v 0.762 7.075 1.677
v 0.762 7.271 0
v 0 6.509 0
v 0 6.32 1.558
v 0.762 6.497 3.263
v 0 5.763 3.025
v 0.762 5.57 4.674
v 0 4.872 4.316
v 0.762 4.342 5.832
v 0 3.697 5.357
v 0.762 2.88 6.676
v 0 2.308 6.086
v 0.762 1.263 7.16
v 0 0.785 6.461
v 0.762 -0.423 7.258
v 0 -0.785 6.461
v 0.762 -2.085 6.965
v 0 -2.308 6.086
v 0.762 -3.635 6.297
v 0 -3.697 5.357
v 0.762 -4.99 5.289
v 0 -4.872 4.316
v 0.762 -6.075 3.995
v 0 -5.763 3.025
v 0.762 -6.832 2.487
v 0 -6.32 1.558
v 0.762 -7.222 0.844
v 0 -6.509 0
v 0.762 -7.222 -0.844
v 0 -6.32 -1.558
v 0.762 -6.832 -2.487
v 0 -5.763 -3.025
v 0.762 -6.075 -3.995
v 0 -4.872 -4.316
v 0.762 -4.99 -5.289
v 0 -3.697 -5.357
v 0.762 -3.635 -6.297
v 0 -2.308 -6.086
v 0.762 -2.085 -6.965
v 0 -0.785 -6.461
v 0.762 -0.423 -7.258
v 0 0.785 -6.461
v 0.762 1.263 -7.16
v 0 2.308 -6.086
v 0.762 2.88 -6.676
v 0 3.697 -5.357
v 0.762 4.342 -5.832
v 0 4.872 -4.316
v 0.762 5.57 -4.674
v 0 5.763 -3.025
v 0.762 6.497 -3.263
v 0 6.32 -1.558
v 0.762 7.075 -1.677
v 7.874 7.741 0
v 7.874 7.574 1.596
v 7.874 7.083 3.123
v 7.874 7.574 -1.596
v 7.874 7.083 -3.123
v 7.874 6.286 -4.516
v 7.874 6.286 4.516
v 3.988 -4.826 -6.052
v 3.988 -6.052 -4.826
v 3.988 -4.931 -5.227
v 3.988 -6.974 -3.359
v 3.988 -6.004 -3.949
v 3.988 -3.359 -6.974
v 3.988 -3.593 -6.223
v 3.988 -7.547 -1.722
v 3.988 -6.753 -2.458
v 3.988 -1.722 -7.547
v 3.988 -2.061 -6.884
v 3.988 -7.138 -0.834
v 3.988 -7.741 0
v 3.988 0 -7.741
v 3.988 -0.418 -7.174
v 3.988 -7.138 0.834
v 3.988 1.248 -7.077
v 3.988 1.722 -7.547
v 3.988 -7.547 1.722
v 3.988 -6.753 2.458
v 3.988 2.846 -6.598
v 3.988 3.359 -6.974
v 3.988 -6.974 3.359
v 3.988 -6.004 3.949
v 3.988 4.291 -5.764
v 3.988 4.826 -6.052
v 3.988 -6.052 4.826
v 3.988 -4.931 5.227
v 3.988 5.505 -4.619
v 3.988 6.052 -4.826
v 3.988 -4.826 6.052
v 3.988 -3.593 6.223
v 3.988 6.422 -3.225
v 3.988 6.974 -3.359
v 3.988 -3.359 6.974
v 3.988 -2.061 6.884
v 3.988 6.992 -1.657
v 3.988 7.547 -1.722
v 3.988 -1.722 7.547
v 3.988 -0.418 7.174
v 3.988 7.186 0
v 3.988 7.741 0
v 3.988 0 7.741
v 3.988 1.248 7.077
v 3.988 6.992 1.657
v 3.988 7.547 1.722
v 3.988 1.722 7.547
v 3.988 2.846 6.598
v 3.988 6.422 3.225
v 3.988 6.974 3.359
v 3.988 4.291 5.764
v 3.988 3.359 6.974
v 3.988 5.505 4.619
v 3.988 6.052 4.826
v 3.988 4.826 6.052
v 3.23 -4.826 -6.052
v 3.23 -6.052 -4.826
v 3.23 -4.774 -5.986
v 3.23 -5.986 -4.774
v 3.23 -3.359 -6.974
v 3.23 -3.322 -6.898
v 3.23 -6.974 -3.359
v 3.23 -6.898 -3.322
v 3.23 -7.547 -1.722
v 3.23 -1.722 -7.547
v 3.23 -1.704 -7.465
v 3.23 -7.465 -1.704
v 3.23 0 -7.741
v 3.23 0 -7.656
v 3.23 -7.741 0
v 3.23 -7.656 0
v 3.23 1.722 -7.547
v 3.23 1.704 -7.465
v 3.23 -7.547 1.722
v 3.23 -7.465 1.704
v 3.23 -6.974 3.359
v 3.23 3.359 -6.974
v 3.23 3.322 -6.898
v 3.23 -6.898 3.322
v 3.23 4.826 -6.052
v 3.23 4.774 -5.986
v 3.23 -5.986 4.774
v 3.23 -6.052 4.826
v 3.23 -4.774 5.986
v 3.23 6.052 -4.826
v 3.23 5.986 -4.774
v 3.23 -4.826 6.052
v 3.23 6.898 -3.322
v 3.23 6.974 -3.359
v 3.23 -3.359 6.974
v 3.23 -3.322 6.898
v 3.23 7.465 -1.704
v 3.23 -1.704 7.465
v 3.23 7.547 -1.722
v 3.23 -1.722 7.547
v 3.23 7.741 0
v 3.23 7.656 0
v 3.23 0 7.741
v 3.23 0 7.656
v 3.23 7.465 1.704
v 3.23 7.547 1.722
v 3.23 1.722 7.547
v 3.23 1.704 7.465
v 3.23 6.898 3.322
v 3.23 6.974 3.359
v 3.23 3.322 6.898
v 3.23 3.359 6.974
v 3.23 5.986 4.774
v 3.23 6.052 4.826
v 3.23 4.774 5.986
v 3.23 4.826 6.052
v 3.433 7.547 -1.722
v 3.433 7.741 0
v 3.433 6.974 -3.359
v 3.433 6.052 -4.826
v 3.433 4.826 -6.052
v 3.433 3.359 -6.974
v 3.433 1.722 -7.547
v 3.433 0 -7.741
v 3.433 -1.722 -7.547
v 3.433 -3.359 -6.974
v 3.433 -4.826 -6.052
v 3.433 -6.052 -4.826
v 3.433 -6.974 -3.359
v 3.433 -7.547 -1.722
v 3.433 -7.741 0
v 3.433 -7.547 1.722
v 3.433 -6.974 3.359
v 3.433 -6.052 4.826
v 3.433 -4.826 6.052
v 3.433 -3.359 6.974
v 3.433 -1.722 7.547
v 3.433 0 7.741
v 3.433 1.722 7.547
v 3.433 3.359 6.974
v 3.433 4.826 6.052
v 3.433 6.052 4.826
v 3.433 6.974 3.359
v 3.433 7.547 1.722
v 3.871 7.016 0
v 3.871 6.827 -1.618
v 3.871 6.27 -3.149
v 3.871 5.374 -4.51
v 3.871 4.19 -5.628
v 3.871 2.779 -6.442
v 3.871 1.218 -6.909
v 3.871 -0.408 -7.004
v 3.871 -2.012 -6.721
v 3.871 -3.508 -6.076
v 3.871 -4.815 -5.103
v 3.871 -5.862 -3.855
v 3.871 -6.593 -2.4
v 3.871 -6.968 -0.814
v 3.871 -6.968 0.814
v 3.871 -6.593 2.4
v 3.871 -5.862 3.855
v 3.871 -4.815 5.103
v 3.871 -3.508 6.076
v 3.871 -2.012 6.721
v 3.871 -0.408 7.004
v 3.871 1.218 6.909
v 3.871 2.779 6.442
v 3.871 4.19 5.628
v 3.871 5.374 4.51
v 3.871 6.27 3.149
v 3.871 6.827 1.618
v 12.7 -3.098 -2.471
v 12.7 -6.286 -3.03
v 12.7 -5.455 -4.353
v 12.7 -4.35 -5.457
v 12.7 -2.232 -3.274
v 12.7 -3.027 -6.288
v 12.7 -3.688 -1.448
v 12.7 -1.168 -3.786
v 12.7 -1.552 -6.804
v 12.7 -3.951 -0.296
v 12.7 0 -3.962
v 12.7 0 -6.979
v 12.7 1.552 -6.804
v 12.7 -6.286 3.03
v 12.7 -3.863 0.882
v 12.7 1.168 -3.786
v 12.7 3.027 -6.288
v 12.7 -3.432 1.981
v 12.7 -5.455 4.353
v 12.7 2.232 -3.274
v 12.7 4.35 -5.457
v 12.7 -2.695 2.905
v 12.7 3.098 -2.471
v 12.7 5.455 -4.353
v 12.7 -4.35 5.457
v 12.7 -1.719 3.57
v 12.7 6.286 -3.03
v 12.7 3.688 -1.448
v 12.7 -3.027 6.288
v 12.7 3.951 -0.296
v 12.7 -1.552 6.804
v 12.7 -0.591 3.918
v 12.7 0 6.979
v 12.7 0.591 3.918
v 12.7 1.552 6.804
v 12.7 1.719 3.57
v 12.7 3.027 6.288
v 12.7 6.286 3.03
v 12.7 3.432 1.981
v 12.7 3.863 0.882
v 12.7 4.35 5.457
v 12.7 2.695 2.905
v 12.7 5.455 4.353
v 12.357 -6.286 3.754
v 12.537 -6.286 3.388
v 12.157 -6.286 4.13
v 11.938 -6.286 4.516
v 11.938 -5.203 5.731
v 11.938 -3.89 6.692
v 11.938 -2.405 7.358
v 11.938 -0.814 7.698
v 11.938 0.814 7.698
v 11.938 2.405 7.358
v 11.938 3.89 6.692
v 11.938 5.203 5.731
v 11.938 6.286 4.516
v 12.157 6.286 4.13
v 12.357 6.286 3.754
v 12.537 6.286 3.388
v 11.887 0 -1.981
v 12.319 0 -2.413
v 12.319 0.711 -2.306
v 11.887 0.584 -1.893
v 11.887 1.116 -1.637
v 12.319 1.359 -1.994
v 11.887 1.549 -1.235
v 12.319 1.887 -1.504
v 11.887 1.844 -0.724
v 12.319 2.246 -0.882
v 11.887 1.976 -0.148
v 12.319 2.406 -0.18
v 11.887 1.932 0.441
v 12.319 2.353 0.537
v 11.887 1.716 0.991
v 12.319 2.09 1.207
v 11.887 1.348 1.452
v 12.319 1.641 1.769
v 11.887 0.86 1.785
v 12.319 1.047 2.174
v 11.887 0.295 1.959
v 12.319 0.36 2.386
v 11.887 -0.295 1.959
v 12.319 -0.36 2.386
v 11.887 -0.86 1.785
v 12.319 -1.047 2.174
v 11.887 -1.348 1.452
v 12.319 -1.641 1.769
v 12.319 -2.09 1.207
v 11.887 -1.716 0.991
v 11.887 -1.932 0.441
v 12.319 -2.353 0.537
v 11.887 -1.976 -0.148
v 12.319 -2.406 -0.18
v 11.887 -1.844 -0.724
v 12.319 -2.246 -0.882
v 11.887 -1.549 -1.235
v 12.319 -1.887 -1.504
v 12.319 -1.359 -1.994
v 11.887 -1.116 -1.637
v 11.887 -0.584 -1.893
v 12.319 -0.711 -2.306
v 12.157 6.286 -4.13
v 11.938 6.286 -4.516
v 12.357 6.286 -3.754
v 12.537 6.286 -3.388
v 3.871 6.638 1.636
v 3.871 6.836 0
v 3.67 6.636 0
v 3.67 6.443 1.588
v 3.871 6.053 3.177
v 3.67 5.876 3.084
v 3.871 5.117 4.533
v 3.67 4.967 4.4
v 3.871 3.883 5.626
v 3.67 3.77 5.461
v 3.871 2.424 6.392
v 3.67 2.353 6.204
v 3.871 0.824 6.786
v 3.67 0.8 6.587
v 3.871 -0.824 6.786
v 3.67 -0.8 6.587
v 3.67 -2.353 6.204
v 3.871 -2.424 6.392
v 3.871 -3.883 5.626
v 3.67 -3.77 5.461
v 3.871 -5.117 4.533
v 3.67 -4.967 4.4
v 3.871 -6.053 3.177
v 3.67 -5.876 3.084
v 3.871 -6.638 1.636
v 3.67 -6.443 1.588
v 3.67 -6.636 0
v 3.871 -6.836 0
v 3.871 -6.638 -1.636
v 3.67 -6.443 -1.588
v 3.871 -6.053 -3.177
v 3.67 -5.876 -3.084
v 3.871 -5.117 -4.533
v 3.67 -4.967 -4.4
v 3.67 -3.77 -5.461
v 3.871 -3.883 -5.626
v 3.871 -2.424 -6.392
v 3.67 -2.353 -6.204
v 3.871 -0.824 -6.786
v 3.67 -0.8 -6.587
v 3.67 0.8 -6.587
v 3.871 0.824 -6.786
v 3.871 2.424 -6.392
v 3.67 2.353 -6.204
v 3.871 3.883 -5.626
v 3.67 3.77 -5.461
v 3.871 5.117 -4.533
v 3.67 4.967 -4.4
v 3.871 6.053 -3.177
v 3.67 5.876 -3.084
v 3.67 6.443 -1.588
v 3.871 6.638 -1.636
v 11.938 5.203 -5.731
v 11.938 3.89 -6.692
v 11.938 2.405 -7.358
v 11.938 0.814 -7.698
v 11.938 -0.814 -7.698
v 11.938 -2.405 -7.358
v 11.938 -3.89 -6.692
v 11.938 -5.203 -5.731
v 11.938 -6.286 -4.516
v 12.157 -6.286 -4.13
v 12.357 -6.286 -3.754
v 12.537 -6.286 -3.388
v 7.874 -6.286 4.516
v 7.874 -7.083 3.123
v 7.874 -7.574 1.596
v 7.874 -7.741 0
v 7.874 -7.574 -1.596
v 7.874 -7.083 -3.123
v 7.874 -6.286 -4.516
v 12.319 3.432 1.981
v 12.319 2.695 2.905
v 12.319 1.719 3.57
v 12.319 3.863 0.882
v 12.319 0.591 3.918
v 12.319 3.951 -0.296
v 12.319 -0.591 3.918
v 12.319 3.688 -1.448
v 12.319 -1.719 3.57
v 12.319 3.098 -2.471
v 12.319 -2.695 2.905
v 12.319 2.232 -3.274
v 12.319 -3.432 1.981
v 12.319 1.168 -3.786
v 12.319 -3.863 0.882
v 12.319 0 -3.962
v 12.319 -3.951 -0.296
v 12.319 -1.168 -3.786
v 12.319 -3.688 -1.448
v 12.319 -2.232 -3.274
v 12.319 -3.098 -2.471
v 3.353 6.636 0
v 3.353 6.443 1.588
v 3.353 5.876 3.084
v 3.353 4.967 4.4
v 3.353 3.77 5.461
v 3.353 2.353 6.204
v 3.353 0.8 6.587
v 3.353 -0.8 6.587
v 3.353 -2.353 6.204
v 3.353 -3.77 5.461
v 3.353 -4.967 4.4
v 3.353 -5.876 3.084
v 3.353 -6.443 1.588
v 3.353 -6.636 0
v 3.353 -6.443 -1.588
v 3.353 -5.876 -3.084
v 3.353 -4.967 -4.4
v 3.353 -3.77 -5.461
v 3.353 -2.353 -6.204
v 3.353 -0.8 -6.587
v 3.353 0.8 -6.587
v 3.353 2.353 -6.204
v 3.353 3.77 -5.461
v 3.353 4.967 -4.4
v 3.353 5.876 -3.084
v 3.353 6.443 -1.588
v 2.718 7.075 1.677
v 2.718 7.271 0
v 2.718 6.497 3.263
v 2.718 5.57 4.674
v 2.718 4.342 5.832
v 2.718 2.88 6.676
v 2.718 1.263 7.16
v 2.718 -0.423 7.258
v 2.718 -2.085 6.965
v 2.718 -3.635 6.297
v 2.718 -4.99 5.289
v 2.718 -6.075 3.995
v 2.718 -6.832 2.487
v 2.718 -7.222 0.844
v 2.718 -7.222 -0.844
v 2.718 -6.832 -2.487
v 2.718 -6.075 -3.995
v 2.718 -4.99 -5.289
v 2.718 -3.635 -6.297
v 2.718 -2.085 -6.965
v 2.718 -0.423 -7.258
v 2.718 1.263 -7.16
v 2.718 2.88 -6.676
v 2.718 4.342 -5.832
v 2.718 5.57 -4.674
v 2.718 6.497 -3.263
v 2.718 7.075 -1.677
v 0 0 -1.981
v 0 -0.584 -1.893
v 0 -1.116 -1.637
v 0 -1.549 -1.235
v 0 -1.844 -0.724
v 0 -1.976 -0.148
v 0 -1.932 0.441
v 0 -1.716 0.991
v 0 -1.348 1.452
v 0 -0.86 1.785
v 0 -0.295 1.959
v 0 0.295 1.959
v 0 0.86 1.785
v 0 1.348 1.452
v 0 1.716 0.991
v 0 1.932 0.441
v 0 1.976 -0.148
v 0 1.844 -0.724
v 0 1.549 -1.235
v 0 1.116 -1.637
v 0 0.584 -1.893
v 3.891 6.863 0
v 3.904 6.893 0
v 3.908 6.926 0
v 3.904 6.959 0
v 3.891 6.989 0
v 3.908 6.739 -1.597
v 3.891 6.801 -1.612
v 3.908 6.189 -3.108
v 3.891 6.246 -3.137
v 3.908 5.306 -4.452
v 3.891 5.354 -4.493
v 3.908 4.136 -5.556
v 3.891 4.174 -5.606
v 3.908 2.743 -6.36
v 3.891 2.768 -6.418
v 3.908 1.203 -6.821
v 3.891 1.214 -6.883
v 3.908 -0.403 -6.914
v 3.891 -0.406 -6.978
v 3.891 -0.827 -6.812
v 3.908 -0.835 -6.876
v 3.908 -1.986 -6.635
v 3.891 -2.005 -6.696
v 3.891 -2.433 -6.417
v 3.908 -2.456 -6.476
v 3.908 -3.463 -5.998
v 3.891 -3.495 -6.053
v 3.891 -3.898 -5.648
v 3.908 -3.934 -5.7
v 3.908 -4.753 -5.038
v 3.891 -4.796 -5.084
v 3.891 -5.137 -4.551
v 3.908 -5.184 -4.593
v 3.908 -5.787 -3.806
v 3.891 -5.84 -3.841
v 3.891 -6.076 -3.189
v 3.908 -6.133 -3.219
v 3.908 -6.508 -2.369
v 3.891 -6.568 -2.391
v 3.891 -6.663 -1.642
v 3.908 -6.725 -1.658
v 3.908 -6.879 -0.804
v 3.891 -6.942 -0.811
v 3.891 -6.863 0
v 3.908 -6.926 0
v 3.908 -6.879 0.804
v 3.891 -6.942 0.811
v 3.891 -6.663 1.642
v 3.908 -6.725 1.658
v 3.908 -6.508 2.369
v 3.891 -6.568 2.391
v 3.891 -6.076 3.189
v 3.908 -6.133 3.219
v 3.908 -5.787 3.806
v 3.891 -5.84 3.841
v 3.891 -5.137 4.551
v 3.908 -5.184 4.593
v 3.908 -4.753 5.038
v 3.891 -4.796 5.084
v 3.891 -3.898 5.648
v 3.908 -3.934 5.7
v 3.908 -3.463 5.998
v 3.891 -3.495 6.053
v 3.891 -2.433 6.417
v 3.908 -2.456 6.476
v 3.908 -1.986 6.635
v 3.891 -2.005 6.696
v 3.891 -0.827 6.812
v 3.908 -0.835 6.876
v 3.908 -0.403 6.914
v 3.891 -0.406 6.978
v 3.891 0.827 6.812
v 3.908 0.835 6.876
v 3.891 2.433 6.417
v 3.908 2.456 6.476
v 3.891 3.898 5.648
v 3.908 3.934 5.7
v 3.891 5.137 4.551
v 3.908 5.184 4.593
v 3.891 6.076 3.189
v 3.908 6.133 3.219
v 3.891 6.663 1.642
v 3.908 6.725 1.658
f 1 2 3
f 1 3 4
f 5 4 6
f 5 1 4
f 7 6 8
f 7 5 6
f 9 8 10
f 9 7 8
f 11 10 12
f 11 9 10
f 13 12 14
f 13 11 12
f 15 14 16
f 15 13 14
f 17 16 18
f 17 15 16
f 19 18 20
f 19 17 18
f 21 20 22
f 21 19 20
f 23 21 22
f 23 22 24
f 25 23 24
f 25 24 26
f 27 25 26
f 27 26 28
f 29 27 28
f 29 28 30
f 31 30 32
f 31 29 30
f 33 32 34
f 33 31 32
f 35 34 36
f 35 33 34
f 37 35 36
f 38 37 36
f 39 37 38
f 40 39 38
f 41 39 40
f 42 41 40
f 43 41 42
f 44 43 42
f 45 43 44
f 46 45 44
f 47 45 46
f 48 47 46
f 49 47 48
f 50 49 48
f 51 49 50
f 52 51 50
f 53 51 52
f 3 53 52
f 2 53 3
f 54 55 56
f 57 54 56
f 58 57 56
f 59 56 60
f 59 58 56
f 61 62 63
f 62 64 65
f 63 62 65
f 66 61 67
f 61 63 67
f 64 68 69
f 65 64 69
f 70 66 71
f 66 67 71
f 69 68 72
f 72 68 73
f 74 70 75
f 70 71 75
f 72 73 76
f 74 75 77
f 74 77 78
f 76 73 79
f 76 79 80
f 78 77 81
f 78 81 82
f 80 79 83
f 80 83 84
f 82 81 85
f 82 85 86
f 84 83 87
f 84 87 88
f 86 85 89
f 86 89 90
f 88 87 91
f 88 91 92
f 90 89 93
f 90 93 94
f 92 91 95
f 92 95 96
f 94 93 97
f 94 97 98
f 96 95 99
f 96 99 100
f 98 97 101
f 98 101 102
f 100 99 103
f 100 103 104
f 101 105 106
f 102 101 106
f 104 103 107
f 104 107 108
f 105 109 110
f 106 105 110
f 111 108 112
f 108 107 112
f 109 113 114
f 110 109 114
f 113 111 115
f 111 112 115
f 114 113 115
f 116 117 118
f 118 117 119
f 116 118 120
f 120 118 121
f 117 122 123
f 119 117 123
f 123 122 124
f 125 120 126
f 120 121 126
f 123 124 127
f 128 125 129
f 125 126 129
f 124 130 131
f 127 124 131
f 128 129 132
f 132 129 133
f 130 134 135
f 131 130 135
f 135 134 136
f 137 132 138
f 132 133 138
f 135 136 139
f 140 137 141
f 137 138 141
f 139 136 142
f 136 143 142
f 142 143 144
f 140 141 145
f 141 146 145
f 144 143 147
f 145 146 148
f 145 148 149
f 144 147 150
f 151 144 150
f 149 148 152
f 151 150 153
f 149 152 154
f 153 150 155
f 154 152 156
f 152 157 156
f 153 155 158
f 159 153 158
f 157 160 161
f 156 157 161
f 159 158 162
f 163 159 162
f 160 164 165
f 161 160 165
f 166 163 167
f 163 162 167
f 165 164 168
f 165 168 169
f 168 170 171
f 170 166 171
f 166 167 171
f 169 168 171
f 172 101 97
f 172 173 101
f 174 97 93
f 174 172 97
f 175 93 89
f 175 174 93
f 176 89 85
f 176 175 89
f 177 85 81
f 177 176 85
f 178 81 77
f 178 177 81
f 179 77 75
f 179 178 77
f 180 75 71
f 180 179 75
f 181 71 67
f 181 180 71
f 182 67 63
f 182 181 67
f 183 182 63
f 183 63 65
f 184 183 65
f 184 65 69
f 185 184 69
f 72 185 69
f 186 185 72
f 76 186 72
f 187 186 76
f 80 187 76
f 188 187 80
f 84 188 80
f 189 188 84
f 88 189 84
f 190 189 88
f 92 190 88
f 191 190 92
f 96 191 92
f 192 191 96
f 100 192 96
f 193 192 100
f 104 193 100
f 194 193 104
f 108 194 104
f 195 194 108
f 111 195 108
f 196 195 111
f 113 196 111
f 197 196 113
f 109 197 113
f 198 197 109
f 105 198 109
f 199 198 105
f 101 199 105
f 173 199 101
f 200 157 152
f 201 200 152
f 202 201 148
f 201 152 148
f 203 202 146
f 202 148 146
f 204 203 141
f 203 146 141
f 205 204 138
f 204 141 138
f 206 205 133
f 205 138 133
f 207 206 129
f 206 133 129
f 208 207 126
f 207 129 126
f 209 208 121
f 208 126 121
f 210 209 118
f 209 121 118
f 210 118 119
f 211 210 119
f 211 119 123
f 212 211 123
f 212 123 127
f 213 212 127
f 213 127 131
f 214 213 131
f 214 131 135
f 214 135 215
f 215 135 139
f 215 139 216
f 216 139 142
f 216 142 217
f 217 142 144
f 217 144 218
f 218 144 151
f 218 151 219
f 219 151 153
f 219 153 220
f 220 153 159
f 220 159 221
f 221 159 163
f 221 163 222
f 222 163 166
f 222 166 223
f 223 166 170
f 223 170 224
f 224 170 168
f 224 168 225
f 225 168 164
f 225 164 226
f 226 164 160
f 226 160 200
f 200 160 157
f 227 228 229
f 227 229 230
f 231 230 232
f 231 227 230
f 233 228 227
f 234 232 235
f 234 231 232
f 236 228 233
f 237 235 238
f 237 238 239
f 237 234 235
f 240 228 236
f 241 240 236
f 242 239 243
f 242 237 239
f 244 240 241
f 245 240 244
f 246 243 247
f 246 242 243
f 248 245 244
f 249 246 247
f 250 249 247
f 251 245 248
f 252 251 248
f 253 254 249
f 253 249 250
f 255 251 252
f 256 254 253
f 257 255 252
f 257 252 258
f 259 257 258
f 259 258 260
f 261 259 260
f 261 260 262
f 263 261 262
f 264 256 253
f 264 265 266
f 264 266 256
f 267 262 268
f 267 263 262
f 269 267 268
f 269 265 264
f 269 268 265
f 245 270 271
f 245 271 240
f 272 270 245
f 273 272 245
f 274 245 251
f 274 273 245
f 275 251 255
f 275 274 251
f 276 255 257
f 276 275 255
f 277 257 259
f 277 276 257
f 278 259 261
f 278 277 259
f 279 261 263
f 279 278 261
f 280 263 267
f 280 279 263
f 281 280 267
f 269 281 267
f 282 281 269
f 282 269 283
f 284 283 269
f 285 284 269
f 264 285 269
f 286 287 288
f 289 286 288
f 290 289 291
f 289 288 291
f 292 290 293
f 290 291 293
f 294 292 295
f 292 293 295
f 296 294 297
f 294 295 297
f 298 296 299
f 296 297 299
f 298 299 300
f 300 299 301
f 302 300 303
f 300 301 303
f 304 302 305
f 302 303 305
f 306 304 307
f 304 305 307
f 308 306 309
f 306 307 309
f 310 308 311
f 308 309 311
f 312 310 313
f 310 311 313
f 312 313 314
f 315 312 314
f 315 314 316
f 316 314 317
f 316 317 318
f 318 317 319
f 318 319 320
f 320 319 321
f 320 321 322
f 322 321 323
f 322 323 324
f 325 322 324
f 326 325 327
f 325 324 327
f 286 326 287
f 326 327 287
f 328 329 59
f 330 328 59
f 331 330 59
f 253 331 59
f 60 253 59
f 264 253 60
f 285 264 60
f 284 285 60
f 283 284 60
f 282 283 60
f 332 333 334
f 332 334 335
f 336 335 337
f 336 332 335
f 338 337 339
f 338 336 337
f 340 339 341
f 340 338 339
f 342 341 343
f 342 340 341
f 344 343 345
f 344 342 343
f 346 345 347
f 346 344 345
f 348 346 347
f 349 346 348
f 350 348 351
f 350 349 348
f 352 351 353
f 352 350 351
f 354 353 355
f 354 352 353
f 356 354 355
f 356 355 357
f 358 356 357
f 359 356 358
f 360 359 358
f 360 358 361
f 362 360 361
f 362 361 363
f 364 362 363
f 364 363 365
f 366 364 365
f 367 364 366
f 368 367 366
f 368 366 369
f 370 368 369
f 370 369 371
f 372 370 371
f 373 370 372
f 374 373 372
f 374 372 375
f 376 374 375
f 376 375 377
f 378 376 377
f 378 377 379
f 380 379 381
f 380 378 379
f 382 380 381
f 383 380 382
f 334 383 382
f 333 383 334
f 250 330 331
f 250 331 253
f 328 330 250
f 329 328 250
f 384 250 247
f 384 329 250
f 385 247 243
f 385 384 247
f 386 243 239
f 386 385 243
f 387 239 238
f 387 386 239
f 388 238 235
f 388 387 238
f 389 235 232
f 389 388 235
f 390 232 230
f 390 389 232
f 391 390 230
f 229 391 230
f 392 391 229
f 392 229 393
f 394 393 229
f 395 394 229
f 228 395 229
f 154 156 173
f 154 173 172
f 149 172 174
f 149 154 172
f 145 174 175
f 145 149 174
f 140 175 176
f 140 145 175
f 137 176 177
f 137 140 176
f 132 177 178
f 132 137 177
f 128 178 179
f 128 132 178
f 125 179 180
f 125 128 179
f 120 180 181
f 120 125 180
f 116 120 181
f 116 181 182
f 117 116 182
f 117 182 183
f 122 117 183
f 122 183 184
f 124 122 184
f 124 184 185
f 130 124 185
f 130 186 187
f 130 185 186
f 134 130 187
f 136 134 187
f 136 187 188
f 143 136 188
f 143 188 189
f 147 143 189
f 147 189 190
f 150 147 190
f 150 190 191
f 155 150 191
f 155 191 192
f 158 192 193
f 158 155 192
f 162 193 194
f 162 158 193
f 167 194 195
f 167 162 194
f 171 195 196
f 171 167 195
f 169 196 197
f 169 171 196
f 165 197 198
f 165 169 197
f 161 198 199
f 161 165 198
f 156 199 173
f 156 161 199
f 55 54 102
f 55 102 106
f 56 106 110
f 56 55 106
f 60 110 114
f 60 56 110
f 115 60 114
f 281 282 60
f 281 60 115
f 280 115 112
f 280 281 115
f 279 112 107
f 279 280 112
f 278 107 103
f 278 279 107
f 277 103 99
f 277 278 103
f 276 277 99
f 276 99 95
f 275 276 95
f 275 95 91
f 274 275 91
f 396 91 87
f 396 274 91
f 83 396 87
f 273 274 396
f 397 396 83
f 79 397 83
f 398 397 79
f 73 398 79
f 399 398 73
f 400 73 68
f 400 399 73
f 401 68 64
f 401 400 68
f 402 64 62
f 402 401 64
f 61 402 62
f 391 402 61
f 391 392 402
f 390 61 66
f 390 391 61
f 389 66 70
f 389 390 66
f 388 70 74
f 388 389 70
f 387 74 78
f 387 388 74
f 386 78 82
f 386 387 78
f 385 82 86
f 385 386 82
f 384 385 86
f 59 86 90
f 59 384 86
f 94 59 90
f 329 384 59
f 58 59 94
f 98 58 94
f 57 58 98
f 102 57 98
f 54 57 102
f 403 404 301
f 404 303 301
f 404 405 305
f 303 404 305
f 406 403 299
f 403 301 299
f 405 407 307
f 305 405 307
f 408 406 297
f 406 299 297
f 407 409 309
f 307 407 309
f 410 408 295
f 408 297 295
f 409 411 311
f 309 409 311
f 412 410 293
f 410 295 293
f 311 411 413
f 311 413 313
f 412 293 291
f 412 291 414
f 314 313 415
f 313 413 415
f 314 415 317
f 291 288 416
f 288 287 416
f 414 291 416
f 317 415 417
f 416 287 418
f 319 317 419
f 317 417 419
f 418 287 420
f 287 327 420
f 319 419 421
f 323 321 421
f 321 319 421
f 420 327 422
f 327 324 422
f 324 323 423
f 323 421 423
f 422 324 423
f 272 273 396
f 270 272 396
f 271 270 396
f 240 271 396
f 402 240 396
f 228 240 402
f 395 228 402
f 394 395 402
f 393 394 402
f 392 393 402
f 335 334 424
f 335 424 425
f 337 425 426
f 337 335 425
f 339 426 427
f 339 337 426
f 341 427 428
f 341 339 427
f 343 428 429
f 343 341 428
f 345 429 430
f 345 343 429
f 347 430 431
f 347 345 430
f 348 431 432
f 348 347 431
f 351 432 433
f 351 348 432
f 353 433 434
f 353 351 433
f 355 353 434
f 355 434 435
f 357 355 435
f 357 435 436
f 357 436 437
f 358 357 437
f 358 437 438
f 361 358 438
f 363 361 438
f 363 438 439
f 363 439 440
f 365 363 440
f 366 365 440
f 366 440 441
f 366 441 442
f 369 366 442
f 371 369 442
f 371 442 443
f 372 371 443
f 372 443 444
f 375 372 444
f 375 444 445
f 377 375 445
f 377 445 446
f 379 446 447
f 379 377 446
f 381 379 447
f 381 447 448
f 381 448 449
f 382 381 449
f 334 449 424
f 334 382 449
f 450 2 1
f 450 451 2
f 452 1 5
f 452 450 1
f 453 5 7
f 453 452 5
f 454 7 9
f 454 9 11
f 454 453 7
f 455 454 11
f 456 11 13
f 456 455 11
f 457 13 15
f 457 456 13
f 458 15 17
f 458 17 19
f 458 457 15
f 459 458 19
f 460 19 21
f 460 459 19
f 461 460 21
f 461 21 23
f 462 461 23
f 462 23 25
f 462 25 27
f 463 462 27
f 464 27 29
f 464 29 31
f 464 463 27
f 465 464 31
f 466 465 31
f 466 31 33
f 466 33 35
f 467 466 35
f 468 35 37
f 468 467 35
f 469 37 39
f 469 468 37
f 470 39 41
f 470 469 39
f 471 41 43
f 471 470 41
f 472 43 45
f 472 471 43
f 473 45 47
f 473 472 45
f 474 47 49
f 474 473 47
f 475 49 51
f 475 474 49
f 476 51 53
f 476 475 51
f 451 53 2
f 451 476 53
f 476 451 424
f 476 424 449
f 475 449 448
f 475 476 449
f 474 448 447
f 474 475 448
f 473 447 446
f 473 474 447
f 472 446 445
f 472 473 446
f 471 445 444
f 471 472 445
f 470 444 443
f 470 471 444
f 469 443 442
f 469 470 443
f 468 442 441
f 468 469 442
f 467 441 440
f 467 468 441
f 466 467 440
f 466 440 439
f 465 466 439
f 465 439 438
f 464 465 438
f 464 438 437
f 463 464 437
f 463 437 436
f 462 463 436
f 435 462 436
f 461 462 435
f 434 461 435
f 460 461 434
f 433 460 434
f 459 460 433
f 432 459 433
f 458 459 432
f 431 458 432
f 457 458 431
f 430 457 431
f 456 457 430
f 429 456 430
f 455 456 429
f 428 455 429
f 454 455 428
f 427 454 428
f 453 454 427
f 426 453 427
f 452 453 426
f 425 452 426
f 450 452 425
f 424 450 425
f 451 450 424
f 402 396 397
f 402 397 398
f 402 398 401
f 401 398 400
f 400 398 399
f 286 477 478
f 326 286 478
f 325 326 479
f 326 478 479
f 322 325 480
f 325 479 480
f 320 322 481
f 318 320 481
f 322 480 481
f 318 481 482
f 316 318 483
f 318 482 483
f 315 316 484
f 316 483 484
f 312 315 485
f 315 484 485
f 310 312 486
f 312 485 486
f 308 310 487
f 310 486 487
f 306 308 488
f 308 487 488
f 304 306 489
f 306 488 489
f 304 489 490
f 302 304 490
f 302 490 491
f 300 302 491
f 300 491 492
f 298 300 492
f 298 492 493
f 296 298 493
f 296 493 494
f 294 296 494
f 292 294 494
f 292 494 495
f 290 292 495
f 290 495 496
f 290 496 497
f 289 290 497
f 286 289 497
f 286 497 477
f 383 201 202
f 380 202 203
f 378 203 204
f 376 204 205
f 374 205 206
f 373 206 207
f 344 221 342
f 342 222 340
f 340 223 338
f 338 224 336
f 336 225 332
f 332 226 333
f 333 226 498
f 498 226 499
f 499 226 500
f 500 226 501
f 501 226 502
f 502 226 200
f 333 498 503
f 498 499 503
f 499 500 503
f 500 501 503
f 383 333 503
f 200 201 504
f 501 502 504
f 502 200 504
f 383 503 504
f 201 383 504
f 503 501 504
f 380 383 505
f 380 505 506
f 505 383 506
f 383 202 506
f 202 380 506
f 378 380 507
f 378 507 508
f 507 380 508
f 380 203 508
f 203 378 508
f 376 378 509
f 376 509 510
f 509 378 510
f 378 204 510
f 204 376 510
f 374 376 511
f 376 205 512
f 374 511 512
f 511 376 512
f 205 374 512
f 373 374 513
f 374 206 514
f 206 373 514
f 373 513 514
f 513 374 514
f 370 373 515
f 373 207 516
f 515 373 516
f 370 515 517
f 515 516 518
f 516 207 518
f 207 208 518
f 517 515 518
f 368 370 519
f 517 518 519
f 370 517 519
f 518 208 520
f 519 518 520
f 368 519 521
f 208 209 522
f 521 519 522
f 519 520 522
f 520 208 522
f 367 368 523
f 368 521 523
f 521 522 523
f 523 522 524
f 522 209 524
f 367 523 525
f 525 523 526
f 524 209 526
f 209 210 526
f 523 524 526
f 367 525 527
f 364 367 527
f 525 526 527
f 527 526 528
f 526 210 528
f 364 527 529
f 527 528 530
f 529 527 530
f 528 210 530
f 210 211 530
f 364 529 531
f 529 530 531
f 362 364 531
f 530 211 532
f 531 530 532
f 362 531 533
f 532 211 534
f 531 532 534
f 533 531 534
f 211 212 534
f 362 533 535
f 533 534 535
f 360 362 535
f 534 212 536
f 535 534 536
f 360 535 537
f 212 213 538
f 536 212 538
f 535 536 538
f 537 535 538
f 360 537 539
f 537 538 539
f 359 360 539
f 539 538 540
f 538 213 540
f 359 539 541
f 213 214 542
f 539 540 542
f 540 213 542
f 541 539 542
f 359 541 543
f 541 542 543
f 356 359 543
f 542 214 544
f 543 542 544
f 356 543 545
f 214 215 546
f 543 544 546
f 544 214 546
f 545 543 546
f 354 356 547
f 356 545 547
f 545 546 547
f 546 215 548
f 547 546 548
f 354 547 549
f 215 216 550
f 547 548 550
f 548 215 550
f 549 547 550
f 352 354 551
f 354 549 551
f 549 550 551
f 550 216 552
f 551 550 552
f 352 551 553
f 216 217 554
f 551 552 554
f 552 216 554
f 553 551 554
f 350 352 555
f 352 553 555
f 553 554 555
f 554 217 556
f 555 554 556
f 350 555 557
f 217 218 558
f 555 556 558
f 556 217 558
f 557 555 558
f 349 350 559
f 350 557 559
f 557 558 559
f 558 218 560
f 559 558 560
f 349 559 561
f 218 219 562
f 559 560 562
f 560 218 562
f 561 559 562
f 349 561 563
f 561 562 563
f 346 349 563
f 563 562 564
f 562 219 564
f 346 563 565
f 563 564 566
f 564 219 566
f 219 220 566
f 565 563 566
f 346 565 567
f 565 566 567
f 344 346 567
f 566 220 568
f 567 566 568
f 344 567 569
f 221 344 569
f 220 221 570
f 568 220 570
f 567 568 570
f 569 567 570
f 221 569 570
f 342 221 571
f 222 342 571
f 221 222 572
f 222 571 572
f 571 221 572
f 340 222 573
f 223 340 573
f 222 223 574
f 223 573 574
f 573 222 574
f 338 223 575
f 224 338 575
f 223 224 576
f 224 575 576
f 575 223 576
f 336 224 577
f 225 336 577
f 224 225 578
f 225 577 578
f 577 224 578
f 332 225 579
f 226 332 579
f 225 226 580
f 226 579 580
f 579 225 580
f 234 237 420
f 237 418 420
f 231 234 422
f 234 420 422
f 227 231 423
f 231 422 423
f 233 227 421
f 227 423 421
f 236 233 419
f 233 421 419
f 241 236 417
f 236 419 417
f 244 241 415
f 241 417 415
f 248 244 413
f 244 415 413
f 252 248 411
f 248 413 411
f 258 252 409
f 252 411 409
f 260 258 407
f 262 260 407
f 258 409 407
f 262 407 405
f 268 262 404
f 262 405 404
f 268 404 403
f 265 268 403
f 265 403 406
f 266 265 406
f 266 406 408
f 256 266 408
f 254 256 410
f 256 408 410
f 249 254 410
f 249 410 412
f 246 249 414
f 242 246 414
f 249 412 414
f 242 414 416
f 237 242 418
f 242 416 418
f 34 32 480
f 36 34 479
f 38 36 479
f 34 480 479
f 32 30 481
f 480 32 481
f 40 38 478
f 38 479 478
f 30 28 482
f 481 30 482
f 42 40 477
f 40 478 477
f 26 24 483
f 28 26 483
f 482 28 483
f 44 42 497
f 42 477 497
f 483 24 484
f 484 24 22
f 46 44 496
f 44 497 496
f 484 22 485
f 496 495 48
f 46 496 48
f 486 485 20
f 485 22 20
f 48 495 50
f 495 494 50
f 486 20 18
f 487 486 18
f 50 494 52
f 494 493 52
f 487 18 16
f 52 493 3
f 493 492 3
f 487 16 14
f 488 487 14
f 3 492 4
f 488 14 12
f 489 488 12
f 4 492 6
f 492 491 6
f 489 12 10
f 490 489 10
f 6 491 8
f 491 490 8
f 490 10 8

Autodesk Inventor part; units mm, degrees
sketch "Sketch_1" plane through (0, 0, 0) normal (0, 0, 1) x (1, 0, 0)
  line L0 (12.7, 0) -> (0, 0)
  line L1 (0, 0) -> (0, 6.5088)
  line L2 (0, 6.5088) -> (0.762, 7.2708)
  line L3 (0.762, 7.2708) -> (2.7178, 7.2708)
  line L4 (2.7178, 7.2708) -> (3.3528, 6.6357)
  line L5 (3.3528, 6.6357) -> (3.9878, 6.6357)
  line L6 (3.9878, 6.6357) -> (3.9878, 7.7407)
  line L7 (3.9878, 7.7407) -> (11.938, 7.7407)
  line L8 (11.938, 7.7407) -> (12.7, 6.9787)
  line L9 (12.7, 6.9787) -> (12.7, 0)
  line L10 (12.7, 0) -> (0, 0)
revolve "Revolution1" add sketch "Sketch_1" angle 360 about axis through (12.7, 0, 0) along (1, 0, 0)
sketch "Sketch2" plane through (12.7, 0, 0) normal (1, 0, 0) x (0, 0, -1)
  point P0 (0, 0)
hole "Drilling 1" at (12.7, 0, 0) direction (-1, 0, 0) diameter 7.9248 depth 0.381
sketch "Sketch3" plane through (12.319, 0, 0) normal (1, 0, 0) x (0, 0, -1)
  point P0 (0, 0)
hole "Drilling 2" at (12.319, 0, 0) direction (-1, 0, 0) diameter 3.9624 depth 12.319 countersink diameter 4.826 countersink angle 90 thread size "10-32 UNF" class "2B" standard "ANSI Unified Screw Threads"
sketch "Sketch_5" plane through (12.7, 0, 0) normal (1, 0, 0) x (0, 0, -1)
  line L0 (-30.9626, 15.4813) -> (-30.9626, -15.4813)
  line L1 (-30.9626, -15.4813) -> (30.9626, -15.4813)
  line L2 (30.9626, -15.4813) -> (30.9626, 15.4813)
  line L3 (30.9626, 15.4813) -> (-30.9626, 15.4813)
  line L4 (-15.4813, 6.2865) -> (-15.4813, -6.2865)
  line L5 (-15.4813, -6.2865) -> (15.4813, -6.2865)
  line L6 (15.4813, -6.2865) -> (15.4813, 6.2865)
  line L7 (15.4813, 6.2865) -> (-15.4813, 6.2865)
extrude "Extrusion1" cut sketch "Sketch_5" against normal blind 4.826
sketch "Sketch_24" plane through (0, 0, 0) normal (0, 0, 1) x (1, 0, 0)
  line L0 (3.9878, 0) -> (3.3528, 0)
  line L1 (3.2301, 7.6565) -> (3.8708, 7.0158)
  arc A0 (3.8708, 6.8362) -> (3.8708, 7.0158) centre (3.781, 6.926) ccw
  line L2 (3.8708, 6.8362) -> (3.6703, 6.6357)
  line L3 (3.6703, 6.6357) -> (3.3528, 6.6357)
  line L4 (3.3528, 6.6357) -> (3.3528, 6.3818)
  line L5 (3.3528, 6.3818) -> (3.9878, 6.3818)
  line L6 (3.9878, 6.3818) -> (3.9878, 7.1861)
  line L7 (3.9878, 7.1861) -> (3.4333, 7.7407)
  line L8 (3.4333, 7.7407) -> (3.2301, 7.7407)
  line L9 (3.2301, 7.7407) -> (3.2301, 7.6565)
revolve "Revolution2" add sketch "Sketch_24" angle 360 about axis through (3.9878, 0, 0) along (1, 0, 0)
ref_plane "cut1_XY" through (12.7, 6.2865, 0) normal (1, 0, 0) x (0, 0, -1)
ref_plane "cut1_YZ" through (12.7, 6.2865, 0) normal (0, 0, -1) x (0, 1, 0)
ref_plane "cut1_ZX" through (12.7, 6.2865, 0) normal (0, 1, 0) x (1, 0, 0)
ref_plane "cut2_XY" through (12.7, -6.2865, 0) normal (1, 0, 0) x (0, 0, -1)
ref_plane "cut2_YZ" through (12.7, -6.2865, 0) normal (0, 0, -1) x (0, 1, 0)
ref_plane "cut2_ZX" through (12.7, -6.2865, 0) normal (0, 1, 0) x (1, 0, 0)
ref_plane "to_tube_XY" through (3.3528, 0, 0) normal (1, 0, 0) x (0, 0, -1)
ref_plane "to_tube_YZ" through (3.3528, 0, 0) normal (0, 0, -1) x (0, 1, 0)
ref_plane "to_tube_ZX" through (3.3528, 0, 0) normal (0, 1, 0) x (1, 0, 0)
ref_plane "lovra_XY" through (12.7, 0, 0) normal (1, 0, 0) x (0, 1, 0)
ref_plane "lovra_YZ" through (12.7, 0, 0) normal (0, 1, 0) x (0, 0, 1)
ref_plane "lovra_ZX" through (12.7, 0, 0) normal (0, 0, 1) x (1, 0, 0)
ref_plane "to_nut_XY" through (0, 0, 0) normal (1, 0, 0) x (0, 0, -1)
ref_plane "to_nut_YZ" through (0, 0, 0) normal (0, 0, -1) x (0, 1, 0)
ref_plane "to_nut_ZX" through (0, 0, 0) normal (0, 1, 0) x (1, 0, 0)
ref_plane "lovra1_XY" through (7.874, 0, 0) normal (1, 0, 0) x (0, 0, -1)
ref_plane "lovra1_YZ" through (7.874, 0, 0) normal (0, 0, -1) x (0, 1, 0)
ref_plane "lovra1_ZX" through (7.874, 0, 0) normal (0, 1, 0) x (1, 0, 0)
ref_plane "lovra2_XY" through (7.874, 6.2865, 0) normal (1, 0, 0) x (0, 0, -1)
ref_plane "lovra2_YZ" through (7.874, 6.2865, 0) normal (0, 0, -1) x (0, 1, 0)
ref_plane "lovra2_ZX" through (7.874, 6.2865, 0) normal (0, 1, 0) x (1, 0, 0)
ref_plane "lovra3_XY" through (7.874, -6.2865, 0) normal (1, 0, 0) x (0, 0, -1)
ref_plane "lovra3_YZ" through (7.874, -6.2865, 0) normal (0, 0, -1) x (0, 1, 0)
ref_plane "lovra3_ZX" through (7.874, -6.2865, 0) normal (0, 1, 0) x (1, 0, 0)
ref_plane "olen_XY" through (12.7, 0, 0) normal (1, 0, 0) x (0, 0, -1)
ref_plane "olen_YZ" through (12.7, 0, 0) normal (0, 0, -1) x (0, 1, 0)
ref_plane "olen_ZX" through (12.7, 0, 0) normal (0, 1, 0) x (1, 0, 0)
ref_plane "cutf1_XY" through (12.7, 7.7407, 0) normal (0, 0, 1) x (1, 0, 0)
ref_plane "cutf1_YZ" through (12.7, 7.7407, 0) normal (1, 0, 0) x (0, 1, 0)
ref_plane "cutf1_ZX" through (12.7, 7.7407, 0) normal (0, 1, 0) x (0, 0, 1)
ref_plane "cutf2_XY" through (7.874, 7.7407, 0) normal (0, 0, 1) x (1, 0, 0)
ref_plane "cutf2_YZ" through (7.874, 7.7407, 0) normal (1, 0, 0) x (0, 1, 0)
ref_plane "cutf2_ZX" through (7.874, 7.7407, 0) normal (0, 1, 0) x (0, 0, 1)
ref_plane "lovra21_XY" through (0, 0, 5.2705) normal (1, 0, 0) x (0, 0, -1)
ref_plane "lovra21_YZ" through (0, 0, 5.2705) normal (0, 0, -1) x (0, 1, 0)
ref_plane "lovra21_ZX" through (0, 0, 5.2705) normal (0, 1, 0) x (1, 0, 0)
ref_plane "lovra22_XY" through (0, 0, -5.2705) normal (1, 0, 0) x (0, 0, -1)
ref_plane "lovra22_YZ" through (0, 0, -5.2705) normal (0, 0, -1) x (0, 1, 0)
ref_plane "lovra22_ZX" through (0, 0, -5.2705) normal (0, 1, 0) x (1, 0, 0)
ref_plane "to_pin_XY" through (19.8374, 0, 0) normal (0, 0, 1) x (1, 0, 0)
ref_plane "to_pin_YZ" through (19.8374, 0, 0) normal (1, 0, 0) x (0, 1, 0)
ref_plane "to_pin_ZX" through (19.8374, 0, 0) normal (0, 1, 0) x (0, 0, 1)
ref_plane "mbr_XY" through (13.5128, 0, 0) normal (1, 0, 0) x (0, 0, -1)
ref_plane "mbr_YZ" through (13.5128, 0, 0) normal (0, 0, -1) x (0, 1, 0)
ref_plane "mbr_ZX" through (13.5128, 0, 0) normal (0, 1, 0) x (1, 0, 0)
ref_plane "to_nut1_XY" through (15.0876, 0, 0) normal (1, 0, 0) x (0, 0, -1)
ref_plane "to_nut1_YZ" through (15.0876, 0, 0) normal (0, 0, -1) x (0, 1, 0)
ref_plane "to_nut1_ZX" through (15.0876, 0, 0) normal (0, 1, 0) x (1, 0, 0)
properties part number "02R00_NR_rear_head"
